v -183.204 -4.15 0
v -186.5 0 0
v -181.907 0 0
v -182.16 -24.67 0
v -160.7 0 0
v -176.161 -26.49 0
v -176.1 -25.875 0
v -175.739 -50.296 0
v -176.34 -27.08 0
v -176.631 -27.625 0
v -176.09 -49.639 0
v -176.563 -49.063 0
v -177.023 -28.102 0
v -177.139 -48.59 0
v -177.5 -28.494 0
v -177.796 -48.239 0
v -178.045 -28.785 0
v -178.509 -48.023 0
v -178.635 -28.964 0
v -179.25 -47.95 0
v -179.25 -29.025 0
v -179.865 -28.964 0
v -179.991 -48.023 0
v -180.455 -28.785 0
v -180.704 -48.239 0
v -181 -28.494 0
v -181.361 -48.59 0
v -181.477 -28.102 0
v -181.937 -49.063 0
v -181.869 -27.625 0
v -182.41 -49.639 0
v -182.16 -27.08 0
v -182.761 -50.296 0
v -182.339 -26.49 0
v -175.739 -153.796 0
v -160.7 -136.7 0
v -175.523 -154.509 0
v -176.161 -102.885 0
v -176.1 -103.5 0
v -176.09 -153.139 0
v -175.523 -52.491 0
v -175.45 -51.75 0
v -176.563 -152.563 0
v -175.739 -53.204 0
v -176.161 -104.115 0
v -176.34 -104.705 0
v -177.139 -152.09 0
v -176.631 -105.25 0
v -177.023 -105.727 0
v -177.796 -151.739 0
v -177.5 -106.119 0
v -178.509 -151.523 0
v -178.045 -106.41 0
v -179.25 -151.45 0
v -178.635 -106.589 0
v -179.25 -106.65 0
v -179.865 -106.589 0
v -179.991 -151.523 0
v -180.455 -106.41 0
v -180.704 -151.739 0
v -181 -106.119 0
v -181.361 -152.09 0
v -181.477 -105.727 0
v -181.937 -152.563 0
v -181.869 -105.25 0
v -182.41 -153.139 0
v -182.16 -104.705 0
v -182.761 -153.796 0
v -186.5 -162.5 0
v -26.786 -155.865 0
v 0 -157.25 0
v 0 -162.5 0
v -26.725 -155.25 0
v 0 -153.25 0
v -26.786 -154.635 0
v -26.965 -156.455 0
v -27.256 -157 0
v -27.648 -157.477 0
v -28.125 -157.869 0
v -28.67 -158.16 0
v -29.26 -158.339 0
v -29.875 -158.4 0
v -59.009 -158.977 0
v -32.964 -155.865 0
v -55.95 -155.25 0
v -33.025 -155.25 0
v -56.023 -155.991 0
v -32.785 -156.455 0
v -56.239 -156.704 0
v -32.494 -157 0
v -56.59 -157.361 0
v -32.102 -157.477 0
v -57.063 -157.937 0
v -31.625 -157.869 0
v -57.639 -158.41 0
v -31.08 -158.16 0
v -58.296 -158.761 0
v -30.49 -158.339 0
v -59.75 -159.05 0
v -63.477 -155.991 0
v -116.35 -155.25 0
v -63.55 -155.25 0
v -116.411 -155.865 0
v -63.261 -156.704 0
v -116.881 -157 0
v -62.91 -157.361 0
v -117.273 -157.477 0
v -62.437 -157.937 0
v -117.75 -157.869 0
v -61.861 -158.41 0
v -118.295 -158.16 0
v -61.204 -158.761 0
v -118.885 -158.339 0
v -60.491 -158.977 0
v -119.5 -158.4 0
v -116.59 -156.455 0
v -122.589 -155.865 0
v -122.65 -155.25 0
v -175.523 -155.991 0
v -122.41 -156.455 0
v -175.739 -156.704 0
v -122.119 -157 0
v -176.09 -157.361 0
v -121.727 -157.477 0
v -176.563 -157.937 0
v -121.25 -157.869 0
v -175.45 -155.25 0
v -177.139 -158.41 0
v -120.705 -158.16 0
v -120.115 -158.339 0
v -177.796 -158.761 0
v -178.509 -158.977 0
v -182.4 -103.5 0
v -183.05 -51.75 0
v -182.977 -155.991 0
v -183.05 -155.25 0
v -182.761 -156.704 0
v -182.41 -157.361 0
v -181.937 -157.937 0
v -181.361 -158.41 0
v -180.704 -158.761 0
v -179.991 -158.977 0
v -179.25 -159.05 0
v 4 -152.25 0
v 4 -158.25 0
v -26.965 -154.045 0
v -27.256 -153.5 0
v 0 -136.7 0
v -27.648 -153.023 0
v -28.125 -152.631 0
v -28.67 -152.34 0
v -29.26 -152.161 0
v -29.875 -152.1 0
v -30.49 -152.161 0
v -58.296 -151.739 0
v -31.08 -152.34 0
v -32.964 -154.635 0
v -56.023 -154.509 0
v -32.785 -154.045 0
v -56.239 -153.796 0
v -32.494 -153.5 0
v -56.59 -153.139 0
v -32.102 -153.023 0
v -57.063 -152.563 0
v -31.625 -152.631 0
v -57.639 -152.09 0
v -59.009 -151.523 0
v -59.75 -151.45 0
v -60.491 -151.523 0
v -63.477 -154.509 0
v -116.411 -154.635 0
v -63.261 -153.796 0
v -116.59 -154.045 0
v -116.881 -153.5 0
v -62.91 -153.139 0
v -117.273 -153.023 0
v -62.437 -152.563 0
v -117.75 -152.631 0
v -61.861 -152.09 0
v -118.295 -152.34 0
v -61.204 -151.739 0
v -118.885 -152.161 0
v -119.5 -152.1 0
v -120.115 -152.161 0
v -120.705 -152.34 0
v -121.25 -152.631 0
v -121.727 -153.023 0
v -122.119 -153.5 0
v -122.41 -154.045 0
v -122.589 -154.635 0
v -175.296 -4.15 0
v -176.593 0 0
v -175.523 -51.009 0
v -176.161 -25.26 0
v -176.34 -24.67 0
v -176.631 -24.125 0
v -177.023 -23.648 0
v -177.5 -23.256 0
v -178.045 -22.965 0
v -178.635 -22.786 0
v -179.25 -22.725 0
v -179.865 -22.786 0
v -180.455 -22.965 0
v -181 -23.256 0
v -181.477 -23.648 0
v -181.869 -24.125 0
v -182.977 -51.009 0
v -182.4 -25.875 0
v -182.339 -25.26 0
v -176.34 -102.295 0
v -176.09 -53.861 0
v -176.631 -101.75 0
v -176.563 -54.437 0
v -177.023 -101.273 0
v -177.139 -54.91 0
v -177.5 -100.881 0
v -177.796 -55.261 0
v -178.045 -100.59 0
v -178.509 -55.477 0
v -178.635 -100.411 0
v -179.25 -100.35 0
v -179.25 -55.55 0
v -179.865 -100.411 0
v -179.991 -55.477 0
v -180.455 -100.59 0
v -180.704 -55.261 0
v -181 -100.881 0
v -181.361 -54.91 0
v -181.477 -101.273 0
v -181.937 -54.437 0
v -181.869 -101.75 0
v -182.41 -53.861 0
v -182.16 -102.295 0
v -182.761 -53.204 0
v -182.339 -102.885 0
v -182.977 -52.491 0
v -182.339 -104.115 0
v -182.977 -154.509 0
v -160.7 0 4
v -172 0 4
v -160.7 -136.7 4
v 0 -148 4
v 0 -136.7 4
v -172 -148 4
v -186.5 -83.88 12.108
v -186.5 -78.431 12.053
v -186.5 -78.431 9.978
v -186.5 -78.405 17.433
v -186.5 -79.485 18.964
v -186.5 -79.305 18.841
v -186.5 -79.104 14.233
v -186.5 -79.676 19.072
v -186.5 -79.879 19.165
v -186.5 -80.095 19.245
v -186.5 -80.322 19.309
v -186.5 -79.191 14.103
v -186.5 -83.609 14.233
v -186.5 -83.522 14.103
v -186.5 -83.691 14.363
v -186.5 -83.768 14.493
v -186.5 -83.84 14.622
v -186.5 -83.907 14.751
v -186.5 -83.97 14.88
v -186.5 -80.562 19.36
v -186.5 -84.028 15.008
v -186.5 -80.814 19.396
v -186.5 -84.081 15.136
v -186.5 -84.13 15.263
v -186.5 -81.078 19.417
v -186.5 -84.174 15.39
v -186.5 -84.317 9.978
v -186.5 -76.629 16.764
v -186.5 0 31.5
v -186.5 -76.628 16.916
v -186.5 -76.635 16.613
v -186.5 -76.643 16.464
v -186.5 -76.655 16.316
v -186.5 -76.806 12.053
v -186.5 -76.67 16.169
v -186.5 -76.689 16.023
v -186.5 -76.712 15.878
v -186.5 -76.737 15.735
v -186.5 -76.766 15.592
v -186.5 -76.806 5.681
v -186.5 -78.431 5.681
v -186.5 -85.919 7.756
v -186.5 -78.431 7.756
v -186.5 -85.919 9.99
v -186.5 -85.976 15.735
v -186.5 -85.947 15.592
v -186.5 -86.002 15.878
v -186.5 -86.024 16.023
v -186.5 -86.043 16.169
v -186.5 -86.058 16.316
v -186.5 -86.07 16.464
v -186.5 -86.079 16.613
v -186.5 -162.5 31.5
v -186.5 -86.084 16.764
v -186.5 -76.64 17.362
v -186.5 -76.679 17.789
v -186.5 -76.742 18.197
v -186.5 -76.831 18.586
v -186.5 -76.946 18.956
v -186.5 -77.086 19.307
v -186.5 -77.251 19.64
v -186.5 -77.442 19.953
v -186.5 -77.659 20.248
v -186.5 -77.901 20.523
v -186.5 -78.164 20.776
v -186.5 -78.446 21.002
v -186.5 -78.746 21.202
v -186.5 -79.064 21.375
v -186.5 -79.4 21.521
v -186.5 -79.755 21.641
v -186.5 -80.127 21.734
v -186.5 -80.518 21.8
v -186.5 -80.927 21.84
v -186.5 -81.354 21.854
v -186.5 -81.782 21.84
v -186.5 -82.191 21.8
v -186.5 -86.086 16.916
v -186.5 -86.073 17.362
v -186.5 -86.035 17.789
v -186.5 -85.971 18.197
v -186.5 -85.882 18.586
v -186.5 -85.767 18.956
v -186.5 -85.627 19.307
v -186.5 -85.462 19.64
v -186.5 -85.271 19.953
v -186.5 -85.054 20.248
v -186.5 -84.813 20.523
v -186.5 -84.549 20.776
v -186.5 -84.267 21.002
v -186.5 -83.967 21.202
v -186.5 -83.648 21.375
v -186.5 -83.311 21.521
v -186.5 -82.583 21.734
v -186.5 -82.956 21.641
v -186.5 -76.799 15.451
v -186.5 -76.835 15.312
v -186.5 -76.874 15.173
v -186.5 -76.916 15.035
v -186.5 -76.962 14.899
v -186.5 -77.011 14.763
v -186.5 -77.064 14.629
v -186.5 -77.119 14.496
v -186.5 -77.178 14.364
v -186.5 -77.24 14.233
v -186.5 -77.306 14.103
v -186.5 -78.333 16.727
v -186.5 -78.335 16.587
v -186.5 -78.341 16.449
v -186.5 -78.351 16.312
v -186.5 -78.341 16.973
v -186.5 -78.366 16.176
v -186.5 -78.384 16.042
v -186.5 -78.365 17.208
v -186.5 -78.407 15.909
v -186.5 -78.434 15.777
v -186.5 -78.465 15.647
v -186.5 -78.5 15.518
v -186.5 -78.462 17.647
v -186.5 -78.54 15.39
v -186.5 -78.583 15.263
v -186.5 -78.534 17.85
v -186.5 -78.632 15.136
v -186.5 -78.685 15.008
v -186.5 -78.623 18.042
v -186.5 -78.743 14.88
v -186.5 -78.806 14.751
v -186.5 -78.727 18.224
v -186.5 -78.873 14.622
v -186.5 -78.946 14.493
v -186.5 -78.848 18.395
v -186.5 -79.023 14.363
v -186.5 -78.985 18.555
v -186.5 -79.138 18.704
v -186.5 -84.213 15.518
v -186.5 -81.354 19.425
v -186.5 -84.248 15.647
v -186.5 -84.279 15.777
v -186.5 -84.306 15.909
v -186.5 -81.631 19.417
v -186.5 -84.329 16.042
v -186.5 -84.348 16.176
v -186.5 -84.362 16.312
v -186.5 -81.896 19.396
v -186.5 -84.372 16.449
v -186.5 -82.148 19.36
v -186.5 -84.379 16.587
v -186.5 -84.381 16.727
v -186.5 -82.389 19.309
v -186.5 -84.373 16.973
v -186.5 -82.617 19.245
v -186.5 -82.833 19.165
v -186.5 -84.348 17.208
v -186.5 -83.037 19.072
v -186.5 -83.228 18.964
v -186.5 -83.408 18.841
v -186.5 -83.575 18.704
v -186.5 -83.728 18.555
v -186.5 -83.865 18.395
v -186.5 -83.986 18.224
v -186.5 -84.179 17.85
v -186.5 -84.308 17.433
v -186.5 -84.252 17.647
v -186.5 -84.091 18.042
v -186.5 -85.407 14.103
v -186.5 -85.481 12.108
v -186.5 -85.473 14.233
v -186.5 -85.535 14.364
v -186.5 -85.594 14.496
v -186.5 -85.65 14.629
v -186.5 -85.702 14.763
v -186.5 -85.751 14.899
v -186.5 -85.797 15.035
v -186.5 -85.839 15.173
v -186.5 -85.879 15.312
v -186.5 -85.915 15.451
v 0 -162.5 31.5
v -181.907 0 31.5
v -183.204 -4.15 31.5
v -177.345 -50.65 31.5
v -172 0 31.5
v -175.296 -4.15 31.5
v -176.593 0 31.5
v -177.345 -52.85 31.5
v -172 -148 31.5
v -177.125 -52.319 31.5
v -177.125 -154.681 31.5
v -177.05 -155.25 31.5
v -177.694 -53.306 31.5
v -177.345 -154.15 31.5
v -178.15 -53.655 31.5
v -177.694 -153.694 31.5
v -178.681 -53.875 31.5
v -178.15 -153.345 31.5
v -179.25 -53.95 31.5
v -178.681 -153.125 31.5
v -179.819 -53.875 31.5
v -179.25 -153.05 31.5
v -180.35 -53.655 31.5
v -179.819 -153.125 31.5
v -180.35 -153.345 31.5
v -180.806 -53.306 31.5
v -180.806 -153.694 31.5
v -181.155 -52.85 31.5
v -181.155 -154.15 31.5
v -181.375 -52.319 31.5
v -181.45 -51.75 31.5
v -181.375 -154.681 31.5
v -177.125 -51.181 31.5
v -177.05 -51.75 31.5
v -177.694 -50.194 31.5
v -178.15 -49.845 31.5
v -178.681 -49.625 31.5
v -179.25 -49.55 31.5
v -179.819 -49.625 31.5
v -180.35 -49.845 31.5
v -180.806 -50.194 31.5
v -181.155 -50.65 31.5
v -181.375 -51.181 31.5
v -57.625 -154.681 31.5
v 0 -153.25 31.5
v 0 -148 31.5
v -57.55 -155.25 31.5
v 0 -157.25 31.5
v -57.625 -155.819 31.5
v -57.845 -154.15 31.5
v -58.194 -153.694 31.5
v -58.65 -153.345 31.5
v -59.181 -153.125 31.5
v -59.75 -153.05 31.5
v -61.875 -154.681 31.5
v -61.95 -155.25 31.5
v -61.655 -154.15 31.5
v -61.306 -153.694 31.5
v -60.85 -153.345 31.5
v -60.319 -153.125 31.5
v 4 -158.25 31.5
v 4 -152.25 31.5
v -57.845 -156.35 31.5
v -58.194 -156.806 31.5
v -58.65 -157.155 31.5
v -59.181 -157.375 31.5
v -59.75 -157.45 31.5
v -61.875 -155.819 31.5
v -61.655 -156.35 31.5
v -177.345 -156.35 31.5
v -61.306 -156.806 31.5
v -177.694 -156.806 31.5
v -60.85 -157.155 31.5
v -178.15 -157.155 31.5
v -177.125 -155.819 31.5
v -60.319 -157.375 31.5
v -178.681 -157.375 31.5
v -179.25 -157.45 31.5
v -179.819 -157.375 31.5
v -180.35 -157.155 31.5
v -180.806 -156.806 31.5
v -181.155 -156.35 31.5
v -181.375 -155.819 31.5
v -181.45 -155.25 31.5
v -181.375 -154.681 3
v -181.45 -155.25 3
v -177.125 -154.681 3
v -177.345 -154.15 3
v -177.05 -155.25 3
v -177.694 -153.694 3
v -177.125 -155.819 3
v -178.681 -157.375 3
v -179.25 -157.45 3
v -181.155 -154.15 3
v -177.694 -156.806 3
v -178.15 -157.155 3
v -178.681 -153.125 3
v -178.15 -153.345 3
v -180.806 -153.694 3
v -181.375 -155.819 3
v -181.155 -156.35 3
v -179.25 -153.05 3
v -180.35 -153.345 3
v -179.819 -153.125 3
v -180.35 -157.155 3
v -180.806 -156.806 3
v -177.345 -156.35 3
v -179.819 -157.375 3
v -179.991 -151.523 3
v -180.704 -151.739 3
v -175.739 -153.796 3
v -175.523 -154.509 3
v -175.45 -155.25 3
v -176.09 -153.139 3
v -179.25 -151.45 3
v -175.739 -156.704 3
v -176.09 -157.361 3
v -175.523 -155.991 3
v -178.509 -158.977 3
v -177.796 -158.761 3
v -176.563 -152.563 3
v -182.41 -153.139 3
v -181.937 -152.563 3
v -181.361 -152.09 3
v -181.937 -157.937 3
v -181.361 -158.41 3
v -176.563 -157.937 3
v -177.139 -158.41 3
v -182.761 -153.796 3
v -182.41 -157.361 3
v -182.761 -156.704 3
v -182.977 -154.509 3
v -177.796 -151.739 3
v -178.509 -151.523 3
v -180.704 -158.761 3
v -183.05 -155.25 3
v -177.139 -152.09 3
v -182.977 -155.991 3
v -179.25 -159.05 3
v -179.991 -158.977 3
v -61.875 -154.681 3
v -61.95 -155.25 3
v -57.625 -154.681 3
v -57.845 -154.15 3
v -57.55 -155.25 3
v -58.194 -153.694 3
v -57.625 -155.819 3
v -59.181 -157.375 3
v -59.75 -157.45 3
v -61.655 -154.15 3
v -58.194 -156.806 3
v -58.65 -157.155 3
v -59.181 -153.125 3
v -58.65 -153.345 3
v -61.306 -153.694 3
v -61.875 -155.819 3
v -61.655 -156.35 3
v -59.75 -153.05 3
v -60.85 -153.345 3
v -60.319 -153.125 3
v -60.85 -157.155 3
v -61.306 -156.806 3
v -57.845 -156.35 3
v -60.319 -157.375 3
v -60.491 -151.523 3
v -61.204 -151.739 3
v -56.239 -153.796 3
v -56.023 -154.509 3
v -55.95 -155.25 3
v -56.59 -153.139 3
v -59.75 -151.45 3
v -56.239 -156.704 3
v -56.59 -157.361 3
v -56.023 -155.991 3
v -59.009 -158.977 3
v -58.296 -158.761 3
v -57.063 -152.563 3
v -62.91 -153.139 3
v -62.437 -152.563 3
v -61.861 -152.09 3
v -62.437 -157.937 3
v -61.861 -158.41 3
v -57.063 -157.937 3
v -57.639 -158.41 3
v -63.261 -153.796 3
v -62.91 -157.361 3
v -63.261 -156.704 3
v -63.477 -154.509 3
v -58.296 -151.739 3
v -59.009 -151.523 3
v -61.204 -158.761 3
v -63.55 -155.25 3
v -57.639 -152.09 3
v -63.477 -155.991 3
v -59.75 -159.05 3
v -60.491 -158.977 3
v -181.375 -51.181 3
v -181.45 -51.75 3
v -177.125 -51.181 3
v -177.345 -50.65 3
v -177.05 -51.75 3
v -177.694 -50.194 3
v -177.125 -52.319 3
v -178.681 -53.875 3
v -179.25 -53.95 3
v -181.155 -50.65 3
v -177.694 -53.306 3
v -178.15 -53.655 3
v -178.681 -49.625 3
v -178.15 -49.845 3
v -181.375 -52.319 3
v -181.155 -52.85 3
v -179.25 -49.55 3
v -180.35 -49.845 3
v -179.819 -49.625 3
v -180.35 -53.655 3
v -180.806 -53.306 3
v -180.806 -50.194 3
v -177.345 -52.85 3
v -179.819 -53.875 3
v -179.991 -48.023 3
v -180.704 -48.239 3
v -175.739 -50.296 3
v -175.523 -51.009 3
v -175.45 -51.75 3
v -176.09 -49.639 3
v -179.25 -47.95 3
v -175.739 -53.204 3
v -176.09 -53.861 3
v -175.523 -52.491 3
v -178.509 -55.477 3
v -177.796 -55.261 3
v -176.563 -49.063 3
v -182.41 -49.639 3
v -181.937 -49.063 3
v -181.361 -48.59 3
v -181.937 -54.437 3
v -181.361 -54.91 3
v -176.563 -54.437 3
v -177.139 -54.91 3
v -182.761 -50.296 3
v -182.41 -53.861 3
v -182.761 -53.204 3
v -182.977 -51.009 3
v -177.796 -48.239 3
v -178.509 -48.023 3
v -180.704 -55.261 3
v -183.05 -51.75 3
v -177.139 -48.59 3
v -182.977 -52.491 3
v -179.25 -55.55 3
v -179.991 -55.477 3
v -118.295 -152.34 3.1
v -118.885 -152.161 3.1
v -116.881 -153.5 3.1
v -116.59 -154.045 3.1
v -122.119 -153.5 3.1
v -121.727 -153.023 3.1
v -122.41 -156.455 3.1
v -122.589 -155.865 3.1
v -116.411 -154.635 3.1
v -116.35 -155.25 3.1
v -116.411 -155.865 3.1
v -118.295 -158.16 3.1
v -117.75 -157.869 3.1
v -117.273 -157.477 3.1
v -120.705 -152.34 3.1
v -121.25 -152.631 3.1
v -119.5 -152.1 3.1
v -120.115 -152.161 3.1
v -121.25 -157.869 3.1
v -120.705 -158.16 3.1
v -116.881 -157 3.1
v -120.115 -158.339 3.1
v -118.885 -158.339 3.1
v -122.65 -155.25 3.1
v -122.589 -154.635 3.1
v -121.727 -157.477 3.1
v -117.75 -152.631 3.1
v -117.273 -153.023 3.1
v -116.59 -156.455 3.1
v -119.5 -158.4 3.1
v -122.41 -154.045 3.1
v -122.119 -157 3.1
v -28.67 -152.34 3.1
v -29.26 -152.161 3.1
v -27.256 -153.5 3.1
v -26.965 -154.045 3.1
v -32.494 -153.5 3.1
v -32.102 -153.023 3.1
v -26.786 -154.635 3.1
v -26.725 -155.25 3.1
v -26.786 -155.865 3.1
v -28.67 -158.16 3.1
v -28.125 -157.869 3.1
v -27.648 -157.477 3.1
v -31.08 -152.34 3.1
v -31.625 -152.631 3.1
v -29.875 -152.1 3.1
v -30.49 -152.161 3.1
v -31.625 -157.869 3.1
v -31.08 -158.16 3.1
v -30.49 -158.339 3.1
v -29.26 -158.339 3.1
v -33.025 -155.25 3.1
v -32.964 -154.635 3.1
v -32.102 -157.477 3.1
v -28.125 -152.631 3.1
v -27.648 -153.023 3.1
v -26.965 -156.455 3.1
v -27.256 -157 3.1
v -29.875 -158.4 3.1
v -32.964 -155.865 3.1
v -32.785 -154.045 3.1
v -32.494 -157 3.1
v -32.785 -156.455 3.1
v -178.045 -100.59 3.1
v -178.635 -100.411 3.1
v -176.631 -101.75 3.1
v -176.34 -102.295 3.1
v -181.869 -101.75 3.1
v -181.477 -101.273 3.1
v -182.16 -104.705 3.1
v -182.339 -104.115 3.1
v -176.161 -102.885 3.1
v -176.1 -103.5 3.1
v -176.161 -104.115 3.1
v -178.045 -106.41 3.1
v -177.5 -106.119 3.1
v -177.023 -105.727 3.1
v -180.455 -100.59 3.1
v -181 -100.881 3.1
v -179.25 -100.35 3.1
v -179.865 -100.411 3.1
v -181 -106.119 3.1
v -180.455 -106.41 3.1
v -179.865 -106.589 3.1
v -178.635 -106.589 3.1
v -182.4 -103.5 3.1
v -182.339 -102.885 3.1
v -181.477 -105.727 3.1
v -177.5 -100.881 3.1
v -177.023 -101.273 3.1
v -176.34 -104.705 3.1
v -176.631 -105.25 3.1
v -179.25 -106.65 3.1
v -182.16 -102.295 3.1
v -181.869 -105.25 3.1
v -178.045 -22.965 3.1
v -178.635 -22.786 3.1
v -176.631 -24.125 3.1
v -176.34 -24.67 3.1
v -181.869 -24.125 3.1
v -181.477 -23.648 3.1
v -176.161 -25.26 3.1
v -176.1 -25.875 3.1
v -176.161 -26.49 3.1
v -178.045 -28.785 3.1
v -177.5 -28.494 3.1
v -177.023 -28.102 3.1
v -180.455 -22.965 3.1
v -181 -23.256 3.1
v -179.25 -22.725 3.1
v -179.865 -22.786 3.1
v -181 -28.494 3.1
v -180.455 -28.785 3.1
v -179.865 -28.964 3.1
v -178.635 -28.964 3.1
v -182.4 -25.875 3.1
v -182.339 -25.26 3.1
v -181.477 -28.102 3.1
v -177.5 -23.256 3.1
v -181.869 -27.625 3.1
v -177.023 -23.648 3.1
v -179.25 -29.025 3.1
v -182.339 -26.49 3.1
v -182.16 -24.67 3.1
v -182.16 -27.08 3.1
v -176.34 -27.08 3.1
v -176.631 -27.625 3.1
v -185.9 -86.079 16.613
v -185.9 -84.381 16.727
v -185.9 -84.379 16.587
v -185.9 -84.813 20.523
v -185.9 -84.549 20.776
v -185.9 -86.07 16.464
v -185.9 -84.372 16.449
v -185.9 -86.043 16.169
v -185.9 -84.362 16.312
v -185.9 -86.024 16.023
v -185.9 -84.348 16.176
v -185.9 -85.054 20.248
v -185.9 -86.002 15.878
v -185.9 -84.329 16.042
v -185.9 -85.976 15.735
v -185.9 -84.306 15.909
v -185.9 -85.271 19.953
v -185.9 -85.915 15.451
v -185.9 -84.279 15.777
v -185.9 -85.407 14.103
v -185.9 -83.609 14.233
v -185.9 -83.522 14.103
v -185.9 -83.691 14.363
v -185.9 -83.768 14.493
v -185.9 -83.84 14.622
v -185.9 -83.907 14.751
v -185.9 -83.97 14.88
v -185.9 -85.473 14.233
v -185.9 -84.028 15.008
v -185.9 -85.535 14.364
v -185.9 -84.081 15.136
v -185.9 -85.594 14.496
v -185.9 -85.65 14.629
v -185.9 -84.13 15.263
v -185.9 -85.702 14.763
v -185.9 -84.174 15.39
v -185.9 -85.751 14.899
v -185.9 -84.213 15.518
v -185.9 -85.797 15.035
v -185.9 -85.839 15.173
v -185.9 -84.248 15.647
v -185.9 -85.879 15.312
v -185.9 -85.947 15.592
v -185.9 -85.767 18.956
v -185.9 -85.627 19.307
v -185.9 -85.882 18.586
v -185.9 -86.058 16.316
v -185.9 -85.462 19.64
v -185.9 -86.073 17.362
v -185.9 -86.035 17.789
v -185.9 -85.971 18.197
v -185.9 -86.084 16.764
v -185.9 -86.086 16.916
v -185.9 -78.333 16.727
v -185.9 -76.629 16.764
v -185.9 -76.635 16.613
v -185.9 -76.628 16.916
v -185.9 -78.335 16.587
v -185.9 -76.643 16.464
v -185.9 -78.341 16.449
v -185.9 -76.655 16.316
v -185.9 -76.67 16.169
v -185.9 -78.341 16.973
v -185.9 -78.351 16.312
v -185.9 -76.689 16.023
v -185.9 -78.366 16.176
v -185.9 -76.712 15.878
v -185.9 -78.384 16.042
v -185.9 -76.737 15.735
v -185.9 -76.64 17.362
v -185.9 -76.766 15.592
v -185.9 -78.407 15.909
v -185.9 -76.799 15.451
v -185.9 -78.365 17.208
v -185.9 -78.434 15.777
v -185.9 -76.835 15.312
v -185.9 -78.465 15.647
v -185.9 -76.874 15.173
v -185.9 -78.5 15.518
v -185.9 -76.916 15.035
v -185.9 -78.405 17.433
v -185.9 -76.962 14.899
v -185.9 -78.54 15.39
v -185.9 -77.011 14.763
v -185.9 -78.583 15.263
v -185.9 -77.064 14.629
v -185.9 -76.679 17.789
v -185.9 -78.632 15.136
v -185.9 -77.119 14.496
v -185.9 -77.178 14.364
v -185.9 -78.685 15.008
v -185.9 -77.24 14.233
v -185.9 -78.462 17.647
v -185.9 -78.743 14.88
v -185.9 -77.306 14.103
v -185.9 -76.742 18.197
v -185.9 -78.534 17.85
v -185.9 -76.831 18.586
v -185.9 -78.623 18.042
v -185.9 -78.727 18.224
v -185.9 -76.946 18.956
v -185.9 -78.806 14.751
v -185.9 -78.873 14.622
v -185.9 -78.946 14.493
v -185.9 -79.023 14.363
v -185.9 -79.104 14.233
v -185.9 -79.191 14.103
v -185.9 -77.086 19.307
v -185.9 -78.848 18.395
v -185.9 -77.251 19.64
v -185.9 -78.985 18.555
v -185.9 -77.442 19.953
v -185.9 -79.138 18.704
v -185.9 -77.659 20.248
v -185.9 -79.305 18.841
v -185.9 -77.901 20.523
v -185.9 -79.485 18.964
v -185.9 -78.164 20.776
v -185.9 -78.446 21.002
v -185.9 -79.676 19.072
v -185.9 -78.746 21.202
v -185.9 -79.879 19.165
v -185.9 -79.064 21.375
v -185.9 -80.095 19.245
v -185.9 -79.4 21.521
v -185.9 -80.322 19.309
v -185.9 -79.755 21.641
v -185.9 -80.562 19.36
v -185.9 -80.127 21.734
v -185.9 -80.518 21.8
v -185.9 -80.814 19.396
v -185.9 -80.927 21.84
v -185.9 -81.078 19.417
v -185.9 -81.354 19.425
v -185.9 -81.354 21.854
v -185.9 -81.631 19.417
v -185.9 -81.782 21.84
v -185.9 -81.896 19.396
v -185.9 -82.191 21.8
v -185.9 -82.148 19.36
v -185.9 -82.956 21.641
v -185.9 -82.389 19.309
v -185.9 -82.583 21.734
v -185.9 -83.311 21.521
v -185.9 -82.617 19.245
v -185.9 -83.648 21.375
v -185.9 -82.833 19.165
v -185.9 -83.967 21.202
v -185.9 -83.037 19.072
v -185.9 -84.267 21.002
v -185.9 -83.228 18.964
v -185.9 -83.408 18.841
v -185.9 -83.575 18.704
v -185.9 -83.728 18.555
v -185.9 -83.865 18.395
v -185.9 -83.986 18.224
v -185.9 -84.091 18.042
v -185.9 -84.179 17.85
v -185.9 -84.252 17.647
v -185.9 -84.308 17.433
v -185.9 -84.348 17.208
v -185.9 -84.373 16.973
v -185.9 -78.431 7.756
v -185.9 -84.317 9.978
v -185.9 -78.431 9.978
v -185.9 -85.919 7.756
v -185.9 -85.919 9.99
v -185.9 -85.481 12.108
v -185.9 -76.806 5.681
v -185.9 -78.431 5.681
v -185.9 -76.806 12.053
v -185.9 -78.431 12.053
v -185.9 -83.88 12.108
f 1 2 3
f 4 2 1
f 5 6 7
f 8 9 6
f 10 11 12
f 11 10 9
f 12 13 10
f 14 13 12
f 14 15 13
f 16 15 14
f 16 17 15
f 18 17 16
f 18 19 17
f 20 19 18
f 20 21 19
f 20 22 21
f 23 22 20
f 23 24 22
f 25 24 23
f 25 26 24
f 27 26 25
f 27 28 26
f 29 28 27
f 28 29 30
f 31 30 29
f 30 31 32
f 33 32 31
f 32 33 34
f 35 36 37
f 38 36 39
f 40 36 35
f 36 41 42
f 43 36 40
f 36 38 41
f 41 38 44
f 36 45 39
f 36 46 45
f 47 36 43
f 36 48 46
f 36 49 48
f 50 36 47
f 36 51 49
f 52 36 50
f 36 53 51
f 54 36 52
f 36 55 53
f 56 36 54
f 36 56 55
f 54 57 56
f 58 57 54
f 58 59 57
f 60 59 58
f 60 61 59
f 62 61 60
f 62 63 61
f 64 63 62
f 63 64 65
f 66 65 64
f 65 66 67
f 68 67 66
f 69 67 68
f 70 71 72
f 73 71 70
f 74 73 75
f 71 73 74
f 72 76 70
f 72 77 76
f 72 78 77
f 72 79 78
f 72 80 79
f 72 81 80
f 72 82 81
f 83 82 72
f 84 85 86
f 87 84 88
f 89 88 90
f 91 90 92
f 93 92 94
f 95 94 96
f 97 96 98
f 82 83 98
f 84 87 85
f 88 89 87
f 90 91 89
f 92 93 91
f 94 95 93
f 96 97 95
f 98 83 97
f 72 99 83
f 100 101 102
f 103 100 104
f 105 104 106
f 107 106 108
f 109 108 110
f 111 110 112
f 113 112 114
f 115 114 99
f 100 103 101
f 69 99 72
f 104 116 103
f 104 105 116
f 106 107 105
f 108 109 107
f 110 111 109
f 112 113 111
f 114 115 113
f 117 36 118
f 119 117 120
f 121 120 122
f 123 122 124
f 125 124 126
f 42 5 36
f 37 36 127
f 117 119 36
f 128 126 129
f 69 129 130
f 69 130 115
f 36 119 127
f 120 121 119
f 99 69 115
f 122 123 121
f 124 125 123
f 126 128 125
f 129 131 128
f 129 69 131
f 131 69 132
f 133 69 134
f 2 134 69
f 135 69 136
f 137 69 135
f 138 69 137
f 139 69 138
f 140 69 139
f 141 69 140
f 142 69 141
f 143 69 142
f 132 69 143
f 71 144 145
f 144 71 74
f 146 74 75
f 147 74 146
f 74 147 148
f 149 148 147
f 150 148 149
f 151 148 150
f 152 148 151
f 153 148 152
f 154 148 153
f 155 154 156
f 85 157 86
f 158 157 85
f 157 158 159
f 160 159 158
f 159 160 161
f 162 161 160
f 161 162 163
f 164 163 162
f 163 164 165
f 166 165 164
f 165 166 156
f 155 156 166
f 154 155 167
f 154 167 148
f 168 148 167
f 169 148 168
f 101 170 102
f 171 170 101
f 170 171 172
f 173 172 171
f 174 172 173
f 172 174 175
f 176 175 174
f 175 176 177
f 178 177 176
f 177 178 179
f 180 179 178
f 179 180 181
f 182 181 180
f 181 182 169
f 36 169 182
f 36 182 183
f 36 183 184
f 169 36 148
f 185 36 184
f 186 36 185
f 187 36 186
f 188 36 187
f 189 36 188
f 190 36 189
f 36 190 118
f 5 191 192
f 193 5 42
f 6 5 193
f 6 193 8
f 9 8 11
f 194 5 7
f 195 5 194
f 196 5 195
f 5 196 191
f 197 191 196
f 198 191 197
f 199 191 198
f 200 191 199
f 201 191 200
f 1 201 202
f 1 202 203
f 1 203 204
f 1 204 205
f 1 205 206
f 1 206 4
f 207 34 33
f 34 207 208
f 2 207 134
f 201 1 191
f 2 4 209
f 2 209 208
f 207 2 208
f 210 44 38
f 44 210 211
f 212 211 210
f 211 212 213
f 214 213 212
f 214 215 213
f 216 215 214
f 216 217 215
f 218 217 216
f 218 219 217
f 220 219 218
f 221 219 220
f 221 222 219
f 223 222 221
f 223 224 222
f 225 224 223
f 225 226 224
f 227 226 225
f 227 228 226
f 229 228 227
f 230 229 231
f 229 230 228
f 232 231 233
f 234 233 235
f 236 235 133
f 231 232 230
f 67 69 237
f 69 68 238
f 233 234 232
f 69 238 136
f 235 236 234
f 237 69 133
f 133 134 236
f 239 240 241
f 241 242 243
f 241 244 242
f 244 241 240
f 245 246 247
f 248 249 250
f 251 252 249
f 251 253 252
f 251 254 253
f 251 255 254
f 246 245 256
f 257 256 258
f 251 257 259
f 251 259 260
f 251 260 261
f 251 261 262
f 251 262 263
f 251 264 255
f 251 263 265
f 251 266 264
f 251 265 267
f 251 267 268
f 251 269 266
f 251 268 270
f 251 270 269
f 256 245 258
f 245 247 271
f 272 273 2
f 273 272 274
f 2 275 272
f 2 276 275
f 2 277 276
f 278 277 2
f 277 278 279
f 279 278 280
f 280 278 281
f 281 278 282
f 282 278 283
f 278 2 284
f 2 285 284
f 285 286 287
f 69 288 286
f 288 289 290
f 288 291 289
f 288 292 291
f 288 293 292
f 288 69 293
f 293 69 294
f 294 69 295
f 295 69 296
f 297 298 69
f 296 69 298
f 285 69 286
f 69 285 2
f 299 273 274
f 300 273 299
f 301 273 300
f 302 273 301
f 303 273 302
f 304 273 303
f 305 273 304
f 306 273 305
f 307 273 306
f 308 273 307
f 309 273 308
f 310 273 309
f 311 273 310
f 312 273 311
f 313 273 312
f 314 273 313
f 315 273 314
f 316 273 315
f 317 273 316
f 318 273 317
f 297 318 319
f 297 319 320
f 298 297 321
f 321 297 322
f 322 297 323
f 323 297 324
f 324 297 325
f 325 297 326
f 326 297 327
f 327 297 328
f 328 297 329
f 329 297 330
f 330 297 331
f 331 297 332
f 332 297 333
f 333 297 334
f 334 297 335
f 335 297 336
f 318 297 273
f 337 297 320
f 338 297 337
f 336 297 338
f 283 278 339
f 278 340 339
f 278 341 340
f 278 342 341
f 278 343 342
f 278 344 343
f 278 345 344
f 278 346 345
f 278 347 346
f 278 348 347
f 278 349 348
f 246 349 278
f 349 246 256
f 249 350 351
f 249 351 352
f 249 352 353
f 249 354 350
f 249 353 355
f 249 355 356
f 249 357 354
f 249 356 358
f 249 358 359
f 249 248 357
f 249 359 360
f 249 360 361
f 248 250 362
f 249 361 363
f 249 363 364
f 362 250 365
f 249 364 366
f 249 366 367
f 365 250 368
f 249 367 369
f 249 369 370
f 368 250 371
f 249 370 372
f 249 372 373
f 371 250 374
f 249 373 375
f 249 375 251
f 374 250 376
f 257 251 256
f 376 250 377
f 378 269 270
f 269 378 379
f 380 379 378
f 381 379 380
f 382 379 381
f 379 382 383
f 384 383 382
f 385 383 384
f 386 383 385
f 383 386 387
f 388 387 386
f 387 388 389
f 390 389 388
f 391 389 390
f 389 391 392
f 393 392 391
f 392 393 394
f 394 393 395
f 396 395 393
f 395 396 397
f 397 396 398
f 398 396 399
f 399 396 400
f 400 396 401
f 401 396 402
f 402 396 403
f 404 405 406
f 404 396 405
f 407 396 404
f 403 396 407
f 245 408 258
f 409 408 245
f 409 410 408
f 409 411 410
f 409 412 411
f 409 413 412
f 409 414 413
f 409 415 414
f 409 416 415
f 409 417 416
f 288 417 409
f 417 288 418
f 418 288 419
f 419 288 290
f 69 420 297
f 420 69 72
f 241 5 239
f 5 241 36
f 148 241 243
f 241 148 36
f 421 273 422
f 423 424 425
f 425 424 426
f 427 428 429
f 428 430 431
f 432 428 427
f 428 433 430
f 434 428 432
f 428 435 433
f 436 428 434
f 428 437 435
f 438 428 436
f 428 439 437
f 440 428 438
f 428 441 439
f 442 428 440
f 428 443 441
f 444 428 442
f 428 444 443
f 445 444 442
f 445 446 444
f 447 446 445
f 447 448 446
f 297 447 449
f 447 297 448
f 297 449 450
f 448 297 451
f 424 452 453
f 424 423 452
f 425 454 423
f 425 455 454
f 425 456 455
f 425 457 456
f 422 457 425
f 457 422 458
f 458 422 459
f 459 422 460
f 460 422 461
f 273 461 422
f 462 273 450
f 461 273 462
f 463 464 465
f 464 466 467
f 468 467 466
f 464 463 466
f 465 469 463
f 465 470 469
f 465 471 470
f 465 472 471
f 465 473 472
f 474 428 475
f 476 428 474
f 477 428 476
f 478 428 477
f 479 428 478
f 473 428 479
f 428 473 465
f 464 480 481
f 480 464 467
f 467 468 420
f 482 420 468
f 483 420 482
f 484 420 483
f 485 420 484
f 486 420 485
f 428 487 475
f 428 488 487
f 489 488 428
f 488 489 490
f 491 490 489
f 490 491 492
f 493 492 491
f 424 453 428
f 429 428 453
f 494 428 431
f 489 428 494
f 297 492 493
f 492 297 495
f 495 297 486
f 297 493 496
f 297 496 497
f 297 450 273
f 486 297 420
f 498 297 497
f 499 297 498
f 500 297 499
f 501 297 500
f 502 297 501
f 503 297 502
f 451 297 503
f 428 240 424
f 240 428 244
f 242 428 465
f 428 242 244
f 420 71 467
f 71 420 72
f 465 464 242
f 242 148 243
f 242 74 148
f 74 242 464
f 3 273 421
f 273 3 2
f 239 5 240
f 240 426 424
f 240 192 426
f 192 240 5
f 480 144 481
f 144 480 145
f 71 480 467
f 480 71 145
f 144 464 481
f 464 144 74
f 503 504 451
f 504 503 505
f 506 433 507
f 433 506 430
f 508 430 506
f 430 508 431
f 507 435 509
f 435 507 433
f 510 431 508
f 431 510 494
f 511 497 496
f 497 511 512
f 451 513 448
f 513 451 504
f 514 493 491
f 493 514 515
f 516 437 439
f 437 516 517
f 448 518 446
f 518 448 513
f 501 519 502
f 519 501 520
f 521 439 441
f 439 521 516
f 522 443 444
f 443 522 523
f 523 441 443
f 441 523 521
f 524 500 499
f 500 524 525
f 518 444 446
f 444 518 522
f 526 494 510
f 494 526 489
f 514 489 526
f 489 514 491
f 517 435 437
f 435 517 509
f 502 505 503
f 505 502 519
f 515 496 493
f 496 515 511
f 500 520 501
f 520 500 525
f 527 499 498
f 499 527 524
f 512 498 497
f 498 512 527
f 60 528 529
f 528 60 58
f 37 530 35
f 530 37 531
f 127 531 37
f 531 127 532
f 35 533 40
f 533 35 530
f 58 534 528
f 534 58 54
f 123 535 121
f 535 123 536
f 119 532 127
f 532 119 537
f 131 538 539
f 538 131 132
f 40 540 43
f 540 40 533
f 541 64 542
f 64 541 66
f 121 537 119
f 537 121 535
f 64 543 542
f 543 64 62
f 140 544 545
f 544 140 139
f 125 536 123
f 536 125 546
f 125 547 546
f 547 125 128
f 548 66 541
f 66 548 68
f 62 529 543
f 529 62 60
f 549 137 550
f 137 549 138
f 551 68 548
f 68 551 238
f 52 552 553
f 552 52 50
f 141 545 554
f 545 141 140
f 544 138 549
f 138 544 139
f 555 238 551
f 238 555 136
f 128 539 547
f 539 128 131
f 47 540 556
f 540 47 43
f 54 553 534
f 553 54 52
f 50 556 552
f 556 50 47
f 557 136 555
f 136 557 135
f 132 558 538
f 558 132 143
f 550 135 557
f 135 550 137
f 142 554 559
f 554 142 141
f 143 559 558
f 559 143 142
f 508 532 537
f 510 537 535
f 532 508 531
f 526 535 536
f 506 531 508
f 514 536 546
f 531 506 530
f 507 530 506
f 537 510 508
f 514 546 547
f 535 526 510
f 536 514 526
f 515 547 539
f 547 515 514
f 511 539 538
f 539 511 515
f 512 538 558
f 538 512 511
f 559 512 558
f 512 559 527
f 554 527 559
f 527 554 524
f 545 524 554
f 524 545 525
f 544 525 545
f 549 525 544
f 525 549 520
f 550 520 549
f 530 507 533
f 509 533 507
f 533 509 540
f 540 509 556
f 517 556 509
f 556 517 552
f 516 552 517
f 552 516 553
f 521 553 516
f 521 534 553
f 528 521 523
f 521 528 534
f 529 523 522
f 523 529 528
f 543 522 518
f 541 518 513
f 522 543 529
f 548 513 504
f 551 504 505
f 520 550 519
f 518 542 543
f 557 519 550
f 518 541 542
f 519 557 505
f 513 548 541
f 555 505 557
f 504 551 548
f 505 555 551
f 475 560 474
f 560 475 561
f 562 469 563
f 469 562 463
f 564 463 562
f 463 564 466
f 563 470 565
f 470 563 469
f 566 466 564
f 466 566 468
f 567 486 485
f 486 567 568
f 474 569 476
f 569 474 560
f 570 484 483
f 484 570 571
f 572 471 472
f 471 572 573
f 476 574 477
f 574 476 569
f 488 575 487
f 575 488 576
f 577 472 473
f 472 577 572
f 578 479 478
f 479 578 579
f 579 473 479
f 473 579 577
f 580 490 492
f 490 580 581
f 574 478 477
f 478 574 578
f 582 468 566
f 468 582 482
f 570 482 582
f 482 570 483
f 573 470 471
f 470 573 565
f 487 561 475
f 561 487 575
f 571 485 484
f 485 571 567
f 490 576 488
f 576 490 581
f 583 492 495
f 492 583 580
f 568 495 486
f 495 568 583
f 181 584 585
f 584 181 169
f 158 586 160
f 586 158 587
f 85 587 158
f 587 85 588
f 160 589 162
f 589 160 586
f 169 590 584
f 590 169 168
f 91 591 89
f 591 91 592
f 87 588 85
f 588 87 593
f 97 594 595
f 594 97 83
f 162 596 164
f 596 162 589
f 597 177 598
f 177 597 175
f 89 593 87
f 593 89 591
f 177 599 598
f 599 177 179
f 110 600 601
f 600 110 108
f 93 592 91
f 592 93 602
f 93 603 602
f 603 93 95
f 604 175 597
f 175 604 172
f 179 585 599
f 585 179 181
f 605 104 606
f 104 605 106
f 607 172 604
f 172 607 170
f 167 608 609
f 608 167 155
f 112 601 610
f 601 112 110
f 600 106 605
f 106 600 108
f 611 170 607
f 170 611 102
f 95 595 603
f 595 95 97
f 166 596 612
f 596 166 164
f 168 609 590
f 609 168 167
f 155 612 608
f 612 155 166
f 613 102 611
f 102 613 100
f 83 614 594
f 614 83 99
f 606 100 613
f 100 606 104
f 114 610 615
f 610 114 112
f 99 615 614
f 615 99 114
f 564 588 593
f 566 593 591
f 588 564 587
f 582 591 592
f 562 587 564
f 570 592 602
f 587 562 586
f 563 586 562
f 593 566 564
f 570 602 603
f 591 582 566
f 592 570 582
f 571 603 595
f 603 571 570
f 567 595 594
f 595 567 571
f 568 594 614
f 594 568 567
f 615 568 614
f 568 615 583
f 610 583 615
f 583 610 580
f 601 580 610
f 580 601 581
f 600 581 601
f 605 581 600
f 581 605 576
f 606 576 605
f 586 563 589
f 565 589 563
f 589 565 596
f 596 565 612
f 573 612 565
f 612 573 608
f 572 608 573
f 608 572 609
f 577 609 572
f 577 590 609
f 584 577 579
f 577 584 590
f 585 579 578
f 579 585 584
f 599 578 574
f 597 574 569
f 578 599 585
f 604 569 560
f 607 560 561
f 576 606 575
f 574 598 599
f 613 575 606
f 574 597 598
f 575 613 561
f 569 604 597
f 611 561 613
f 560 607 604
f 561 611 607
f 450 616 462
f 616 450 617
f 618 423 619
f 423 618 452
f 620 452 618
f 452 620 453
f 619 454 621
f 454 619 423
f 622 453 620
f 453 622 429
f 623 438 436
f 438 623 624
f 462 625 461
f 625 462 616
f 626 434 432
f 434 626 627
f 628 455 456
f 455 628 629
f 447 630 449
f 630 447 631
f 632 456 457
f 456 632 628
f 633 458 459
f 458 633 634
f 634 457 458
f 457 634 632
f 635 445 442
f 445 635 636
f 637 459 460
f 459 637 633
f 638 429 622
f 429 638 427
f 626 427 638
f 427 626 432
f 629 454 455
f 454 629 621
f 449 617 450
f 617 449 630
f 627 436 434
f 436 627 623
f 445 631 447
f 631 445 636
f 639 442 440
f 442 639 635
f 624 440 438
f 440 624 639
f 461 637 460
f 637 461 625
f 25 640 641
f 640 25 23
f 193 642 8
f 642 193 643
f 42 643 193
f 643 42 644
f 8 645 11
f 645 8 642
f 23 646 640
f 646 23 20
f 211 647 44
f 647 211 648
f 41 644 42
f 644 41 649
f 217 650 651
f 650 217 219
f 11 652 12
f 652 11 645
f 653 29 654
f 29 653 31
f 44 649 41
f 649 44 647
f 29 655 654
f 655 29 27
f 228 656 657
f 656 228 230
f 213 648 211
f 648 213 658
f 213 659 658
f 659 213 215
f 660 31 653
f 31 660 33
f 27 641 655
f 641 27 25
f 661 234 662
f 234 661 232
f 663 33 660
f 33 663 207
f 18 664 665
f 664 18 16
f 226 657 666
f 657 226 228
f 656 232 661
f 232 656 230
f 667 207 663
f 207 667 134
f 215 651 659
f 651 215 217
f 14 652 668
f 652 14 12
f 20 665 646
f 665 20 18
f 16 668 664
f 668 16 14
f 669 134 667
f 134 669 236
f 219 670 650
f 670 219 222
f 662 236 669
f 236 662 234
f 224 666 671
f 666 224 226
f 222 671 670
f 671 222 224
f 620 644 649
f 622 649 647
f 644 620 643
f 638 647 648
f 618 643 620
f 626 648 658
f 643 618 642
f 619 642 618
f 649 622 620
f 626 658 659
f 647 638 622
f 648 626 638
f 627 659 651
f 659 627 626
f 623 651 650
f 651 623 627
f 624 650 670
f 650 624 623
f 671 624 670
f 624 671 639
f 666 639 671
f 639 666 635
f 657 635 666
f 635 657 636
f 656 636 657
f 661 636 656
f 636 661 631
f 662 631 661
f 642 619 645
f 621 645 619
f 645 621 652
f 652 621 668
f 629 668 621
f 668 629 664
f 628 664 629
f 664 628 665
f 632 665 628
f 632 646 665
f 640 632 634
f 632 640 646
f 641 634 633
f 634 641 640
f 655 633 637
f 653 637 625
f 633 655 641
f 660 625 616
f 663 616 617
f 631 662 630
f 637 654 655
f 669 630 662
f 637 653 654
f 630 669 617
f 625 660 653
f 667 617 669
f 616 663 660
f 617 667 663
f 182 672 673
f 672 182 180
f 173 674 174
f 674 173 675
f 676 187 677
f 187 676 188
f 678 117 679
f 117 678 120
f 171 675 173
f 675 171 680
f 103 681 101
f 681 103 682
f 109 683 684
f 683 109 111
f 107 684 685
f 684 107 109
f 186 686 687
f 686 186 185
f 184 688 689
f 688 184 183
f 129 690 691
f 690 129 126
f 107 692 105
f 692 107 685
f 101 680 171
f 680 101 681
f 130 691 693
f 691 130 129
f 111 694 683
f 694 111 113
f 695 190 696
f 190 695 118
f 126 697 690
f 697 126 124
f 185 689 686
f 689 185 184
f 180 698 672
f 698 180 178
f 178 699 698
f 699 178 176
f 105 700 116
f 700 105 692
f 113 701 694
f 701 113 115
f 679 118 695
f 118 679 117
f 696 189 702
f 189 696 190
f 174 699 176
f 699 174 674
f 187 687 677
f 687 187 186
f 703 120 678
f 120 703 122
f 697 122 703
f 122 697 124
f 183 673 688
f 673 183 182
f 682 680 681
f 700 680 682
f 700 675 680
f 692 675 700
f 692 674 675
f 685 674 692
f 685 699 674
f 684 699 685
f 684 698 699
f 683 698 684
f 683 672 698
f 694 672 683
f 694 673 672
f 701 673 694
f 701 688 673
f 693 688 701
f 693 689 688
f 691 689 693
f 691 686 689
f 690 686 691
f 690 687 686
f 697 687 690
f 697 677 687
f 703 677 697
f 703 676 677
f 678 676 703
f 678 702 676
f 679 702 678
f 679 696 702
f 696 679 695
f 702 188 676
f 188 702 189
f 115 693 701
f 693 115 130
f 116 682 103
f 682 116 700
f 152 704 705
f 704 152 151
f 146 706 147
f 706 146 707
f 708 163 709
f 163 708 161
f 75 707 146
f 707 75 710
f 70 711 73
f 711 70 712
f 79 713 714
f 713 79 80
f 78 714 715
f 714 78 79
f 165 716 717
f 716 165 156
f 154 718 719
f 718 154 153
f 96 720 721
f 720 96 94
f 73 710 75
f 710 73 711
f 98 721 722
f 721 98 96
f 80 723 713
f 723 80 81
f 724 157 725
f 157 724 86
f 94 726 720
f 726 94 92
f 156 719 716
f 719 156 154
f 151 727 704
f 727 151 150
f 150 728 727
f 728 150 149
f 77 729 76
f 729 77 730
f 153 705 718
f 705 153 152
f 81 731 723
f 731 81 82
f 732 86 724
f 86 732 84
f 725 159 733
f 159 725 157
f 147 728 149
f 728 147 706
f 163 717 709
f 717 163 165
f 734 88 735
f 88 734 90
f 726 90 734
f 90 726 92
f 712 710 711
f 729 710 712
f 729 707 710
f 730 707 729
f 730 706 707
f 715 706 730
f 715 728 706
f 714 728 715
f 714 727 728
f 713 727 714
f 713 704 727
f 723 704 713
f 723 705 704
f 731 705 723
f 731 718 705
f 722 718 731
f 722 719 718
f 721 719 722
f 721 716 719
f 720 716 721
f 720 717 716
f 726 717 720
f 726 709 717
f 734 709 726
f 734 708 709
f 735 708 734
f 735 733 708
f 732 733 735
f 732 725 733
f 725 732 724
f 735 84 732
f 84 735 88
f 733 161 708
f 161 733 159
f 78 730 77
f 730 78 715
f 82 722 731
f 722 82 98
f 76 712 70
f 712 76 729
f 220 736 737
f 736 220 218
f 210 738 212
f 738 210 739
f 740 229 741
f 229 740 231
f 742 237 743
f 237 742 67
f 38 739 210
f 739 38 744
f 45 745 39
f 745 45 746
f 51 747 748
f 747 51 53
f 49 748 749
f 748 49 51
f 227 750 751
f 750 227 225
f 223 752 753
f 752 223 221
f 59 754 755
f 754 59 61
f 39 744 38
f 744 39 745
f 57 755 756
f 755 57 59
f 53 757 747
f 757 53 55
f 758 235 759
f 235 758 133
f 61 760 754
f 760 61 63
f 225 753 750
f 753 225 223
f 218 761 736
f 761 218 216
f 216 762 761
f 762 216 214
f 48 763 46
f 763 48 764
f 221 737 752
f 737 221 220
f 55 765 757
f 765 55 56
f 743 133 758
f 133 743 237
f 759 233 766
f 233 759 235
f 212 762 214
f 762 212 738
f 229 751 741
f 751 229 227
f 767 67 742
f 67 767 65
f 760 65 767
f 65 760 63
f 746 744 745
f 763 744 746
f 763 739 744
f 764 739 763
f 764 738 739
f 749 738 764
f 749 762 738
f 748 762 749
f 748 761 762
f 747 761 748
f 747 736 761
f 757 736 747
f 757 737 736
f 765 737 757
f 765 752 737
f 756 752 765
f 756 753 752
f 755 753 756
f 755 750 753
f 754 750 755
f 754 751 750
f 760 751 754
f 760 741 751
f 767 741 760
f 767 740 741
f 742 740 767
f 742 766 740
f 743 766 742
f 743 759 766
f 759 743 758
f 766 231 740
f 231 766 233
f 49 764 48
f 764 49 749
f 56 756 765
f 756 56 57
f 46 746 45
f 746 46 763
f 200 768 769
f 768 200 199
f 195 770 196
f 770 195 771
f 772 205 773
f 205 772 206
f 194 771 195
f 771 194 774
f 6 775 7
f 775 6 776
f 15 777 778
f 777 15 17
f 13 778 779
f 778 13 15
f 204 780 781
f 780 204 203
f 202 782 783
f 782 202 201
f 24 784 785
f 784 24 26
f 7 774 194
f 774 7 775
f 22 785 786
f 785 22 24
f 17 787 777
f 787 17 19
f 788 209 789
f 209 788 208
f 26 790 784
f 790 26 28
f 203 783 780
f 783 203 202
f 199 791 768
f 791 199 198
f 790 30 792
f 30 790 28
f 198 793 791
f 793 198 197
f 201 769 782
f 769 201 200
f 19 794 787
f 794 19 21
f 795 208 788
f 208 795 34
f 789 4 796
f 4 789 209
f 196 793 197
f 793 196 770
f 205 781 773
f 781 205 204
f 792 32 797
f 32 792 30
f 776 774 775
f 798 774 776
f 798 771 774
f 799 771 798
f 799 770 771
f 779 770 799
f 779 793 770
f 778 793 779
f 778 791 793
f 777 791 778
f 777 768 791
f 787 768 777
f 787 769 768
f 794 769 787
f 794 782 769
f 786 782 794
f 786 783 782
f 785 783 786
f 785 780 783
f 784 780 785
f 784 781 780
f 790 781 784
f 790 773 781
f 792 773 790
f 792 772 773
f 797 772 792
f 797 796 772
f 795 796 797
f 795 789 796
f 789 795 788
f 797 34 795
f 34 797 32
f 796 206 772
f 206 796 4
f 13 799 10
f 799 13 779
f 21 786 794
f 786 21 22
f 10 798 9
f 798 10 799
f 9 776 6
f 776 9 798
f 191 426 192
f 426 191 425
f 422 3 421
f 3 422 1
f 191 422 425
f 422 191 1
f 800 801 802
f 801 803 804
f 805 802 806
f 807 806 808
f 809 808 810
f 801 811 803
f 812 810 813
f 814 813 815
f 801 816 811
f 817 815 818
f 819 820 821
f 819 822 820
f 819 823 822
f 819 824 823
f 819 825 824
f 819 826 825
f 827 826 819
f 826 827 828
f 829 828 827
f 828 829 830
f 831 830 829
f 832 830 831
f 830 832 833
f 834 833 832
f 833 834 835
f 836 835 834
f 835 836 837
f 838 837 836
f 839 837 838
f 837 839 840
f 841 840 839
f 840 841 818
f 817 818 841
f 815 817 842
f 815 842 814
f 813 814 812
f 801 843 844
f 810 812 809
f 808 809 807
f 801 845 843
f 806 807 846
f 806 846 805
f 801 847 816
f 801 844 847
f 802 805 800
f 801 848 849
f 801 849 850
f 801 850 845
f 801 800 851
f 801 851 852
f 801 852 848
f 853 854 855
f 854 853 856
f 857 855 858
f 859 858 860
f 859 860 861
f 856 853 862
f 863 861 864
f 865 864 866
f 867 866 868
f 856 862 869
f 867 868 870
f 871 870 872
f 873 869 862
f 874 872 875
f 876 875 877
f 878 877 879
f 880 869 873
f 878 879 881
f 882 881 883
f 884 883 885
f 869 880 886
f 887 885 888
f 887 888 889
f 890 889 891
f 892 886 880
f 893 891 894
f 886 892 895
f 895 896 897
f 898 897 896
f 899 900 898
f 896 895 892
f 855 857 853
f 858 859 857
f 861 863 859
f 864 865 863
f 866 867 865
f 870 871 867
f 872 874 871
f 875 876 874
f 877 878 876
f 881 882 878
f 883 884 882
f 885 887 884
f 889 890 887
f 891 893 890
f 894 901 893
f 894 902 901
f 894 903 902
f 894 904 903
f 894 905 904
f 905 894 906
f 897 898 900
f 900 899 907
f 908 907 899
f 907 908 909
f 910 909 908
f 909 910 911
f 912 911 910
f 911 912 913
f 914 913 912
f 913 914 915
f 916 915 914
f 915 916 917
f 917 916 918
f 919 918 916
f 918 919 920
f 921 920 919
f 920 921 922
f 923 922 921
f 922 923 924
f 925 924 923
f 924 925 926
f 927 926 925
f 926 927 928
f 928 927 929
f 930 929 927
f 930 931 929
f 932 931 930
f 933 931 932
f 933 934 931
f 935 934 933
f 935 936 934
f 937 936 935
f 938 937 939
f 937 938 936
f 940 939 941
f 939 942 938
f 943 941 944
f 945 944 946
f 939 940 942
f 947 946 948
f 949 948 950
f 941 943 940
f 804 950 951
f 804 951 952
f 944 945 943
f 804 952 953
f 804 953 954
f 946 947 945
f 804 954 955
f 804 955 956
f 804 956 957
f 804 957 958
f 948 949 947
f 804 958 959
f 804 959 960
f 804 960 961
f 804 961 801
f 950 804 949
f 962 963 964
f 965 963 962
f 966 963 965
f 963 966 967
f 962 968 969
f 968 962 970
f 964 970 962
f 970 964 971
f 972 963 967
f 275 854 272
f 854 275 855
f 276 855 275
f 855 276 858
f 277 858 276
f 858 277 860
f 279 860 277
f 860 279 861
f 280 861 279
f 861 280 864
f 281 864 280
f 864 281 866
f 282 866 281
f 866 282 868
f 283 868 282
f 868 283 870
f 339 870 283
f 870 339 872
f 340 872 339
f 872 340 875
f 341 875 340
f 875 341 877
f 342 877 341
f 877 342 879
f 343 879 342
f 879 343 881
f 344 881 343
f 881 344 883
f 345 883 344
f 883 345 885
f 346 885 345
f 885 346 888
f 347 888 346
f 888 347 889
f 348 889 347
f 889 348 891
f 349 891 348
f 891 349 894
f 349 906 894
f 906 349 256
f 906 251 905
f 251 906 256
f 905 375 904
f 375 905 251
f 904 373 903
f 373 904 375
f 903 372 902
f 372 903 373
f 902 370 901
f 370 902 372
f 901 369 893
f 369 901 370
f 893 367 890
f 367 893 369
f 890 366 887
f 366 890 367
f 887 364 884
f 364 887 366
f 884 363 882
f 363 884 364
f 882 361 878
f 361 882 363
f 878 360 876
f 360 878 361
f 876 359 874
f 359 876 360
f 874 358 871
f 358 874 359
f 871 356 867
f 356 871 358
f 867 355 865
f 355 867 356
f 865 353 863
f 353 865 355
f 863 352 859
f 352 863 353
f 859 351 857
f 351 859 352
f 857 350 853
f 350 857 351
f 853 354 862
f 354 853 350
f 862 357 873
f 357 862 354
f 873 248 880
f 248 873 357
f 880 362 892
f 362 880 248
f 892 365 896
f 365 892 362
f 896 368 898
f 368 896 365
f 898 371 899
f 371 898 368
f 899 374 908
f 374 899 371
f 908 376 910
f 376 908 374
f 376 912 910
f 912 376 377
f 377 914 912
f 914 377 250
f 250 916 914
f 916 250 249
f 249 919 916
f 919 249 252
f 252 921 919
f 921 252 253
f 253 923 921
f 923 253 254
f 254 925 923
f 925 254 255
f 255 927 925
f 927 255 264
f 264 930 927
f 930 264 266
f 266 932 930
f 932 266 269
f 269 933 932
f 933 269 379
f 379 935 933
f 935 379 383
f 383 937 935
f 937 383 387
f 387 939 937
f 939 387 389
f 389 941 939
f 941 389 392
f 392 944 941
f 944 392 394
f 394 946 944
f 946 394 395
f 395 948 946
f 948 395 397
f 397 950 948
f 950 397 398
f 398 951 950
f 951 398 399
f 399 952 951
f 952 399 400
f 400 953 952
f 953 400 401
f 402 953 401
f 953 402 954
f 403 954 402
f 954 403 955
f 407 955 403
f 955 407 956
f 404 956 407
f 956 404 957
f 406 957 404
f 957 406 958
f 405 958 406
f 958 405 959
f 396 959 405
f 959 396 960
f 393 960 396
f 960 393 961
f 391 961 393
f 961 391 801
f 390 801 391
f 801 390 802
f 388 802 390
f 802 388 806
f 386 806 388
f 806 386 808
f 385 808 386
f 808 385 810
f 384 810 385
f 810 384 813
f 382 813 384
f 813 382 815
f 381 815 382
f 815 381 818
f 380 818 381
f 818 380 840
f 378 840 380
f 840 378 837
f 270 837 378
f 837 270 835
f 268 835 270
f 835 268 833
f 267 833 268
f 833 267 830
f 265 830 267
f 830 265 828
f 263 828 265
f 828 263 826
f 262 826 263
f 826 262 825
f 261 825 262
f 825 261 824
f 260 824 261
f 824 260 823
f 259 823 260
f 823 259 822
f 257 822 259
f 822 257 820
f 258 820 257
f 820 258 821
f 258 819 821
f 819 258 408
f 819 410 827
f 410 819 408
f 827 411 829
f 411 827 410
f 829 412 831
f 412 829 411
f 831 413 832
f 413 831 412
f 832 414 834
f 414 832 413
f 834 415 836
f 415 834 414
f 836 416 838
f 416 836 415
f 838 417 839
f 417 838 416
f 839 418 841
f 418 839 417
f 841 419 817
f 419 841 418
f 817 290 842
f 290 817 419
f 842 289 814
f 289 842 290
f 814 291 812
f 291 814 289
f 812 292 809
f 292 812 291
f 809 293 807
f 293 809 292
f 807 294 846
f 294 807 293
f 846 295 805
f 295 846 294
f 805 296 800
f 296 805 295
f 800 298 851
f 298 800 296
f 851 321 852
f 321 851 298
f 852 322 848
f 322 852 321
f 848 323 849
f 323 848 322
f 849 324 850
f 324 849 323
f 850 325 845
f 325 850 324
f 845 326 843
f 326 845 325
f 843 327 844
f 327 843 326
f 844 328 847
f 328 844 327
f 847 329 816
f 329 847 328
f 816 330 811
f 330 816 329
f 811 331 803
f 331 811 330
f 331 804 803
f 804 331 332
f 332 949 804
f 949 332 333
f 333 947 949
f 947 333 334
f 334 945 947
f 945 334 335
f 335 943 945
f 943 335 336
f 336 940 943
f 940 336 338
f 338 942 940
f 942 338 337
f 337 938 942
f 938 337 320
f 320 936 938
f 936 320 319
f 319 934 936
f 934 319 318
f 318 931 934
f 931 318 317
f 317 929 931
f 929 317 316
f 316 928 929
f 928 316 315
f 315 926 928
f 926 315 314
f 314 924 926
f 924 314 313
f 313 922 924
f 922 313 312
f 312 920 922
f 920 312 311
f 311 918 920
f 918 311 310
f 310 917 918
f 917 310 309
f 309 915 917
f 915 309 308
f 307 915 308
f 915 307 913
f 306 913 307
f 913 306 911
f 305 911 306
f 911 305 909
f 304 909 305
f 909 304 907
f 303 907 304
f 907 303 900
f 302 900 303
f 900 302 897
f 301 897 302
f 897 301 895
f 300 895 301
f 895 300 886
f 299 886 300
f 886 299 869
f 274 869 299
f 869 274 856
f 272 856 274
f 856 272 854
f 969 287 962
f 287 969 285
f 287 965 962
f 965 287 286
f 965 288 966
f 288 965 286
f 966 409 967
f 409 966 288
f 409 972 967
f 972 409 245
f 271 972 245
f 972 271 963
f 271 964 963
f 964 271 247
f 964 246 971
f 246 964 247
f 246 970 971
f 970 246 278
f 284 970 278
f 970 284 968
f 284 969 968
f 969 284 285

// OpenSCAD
// P09 — Clamp quarter C1 (top-left, 4 magnet pockets). Front face on the bed. PLA, 4 walls, 3 mm brim.
// Needs lfh_v1_reference.scad in the same folder.
include <lfh_v1_reference.scad>
part = "C1";
pose = "print";
